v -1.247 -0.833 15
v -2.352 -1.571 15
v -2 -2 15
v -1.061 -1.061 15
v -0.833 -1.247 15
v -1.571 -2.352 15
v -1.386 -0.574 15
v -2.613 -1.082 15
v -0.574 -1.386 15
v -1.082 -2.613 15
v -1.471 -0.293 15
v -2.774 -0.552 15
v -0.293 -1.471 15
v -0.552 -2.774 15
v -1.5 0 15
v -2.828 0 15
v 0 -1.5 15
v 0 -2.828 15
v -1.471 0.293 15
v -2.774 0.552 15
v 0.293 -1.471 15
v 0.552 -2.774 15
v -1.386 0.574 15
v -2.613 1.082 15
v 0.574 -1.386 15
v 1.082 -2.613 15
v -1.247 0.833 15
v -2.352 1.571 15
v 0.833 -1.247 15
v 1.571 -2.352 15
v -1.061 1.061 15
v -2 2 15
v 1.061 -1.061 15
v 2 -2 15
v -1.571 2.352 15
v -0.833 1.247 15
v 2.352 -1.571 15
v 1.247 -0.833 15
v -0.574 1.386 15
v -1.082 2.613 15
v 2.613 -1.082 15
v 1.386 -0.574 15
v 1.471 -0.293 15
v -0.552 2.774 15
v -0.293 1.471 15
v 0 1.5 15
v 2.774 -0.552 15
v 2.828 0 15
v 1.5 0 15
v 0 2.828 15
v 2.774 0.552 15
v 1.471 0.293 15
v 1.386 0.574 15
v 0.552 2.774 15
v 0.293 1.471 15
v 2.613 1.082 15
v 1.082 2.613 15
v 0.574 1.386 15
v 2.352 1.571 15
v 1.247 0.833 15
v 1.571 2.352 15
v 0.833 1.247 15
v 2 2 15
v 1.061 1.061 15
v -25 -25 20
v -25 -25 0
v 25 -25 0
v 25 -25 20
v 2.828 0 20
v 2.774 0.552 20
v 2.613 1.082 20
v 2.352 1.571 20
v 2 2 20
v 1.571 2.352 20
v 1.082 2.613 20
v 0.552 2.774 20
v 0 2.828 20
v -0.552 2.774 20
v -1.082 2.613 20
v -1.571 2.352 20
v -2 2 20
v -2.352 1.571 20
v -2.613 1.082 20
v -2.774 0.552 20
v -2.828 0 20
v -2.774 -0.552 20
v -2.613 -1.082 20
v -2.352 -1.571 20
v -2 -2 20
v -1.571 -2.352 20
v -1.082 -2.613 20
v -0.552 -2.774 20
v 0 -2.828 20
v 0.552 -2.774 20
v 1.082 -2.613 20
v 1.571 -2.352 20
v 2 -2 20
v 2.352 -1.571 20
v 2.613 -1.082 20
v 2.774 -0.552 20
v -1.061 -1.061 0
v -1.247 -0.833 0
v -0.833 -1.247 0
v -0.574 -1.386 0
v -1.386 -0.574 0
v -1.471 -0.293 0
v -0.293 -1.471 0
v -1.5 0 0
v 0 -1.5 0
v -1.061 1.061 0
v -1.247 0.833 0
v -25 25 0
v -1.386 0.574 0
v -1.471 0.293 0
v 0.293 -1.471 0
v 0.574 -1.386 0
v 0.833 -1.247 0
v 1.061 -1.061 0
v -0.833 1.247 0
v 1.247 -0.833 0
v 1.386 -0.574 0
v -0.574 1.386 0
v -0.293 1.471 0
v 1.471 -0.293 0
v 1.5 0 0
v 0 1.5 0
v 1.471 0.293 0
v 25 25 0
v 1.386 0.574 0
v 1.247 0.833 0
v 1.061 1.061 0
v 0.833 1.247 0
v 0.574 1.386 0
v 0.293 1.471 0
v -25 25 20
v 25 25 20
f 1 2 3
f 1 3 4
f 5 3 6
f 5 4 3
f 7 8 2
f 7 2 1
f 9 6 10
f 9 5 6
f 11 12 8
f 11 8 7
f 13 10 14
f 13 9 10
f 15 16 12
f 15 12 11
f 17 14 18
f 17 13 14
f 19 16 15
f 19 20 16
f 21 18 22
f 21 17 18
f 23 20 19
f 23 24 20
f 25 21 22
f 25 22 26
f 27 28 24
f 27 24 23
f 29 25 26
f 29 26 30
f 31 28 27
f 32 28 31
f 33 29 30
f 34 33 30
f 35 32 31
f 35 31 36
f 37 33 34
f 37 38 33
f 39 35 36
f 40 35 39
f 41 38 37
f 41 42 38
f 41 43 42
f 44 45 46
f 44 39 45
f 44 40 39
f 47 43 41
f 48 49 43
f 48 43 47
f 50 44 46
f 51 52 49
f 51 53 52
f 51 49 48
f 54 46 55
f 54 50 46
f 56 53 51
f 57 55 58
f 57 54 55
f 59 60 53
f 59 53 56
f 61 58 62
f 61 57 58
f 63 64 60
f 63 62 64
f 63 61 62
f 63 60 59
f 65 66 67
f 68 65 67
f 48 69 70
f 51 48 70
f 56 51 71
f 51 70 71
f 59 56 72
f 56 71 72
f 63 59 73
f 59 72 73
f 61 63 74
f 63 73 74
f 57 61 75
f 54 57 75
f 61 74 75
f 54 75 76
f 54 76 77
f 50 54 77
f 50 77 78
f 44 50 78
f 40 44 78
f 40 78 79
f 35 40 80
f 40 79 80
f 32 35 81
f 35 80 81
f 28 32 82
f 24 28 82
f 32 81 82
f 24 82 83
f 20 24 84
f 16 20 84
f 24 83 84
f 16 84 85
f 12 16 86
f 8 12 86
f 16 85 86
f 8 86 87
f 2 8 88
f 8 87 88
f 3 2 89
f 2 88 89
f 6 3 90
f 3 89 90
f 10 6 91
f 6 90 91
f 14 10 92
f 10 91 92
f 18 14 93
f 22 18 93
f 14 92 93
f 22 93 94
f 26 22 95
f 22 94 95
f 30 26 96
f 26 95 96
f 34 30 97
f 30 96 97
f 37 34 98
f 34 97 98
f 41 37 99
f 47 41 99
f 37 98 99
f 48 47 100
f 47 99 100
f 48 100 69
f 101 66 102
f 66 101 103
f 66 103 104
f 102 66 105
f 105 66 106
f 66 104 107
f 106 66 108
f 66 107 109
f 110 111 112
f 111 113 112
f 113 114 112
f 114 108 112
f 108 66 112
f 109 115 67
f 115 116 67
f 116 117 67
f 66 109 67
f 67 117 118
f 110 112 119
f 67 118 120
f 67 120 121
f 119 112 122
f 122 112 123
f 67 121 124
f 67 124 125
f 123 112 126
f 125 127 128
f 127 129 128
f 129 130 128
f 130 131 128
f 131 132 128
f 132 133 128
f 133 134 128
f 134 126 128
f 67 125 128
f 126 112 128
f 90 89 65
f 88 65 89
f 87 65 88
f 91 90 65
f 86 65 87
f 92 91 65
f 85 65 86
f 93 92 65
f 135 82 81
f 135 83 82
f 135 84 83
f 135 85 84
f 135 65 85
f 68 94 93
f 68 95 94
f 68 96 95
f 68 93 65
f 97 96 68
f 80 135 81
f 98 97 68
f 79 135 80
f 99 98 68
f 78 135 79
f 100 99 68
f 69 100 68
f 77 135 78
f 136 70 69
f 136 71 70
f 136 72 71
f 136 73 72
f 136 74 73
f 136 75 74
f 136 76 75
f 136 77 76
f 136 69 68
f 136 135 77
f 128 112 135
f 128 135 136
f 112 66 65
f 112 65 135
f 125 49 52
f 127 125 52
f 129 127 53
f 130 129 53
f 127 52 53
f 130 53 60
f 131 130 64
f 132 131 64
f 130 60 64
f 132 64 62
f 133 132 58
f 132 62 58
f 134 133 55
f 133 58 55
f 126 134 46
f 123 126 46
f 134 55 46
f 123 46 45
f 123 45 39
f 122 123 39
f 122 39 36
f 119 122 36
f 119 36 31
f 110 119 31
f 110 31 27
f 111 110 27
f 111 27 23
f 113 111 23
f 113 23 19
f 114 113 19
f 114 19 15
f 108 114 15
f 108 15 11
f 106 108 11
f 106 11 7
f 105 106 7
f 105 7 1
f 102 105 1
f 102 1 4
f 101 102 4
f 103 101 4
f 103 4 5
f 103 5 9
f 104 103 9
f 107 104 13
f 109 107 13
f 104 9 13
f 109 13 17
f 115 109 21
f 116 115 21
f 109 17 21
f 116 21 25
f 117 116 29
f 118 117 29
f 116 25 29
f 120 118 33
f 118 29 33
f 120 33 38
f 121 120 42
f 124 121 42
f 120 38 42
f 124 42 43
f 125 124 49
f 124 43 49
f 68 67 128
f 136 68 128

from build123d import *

# Parameters (mm, degrees)
F0_W     = 50
F0_H     = 50
F1_DEPTH = 20
F2_R     = 2.828427
F3_DEPTH = 5
F4_R     = 1.5
F5_DEPTH = 25


with BuildPart() as f1:
    # F0 (on Top) → F1 (new body)
    with BuildSketch(Plane.XY):
        Rectangle(F0_W, F0_H)
    extrude(amount=F1_DEPTH)

    # F2 (on face) → F3 (cut)
    with BuildSketch(Plane.XY.offset(20)):
        Circle(F2_R)
    extrude(amount=-F3_DEPTH, mode=Mode.SUBTRACT)

    # F4 (on face) → F5 (cut)
    with BuildSketch(Plane.XY.offset(15)):
        Circle(F4_R)
    extrude(amount=-F5_DEPTH, mode=Mode.SUBTRACT)


solid = f1.part
